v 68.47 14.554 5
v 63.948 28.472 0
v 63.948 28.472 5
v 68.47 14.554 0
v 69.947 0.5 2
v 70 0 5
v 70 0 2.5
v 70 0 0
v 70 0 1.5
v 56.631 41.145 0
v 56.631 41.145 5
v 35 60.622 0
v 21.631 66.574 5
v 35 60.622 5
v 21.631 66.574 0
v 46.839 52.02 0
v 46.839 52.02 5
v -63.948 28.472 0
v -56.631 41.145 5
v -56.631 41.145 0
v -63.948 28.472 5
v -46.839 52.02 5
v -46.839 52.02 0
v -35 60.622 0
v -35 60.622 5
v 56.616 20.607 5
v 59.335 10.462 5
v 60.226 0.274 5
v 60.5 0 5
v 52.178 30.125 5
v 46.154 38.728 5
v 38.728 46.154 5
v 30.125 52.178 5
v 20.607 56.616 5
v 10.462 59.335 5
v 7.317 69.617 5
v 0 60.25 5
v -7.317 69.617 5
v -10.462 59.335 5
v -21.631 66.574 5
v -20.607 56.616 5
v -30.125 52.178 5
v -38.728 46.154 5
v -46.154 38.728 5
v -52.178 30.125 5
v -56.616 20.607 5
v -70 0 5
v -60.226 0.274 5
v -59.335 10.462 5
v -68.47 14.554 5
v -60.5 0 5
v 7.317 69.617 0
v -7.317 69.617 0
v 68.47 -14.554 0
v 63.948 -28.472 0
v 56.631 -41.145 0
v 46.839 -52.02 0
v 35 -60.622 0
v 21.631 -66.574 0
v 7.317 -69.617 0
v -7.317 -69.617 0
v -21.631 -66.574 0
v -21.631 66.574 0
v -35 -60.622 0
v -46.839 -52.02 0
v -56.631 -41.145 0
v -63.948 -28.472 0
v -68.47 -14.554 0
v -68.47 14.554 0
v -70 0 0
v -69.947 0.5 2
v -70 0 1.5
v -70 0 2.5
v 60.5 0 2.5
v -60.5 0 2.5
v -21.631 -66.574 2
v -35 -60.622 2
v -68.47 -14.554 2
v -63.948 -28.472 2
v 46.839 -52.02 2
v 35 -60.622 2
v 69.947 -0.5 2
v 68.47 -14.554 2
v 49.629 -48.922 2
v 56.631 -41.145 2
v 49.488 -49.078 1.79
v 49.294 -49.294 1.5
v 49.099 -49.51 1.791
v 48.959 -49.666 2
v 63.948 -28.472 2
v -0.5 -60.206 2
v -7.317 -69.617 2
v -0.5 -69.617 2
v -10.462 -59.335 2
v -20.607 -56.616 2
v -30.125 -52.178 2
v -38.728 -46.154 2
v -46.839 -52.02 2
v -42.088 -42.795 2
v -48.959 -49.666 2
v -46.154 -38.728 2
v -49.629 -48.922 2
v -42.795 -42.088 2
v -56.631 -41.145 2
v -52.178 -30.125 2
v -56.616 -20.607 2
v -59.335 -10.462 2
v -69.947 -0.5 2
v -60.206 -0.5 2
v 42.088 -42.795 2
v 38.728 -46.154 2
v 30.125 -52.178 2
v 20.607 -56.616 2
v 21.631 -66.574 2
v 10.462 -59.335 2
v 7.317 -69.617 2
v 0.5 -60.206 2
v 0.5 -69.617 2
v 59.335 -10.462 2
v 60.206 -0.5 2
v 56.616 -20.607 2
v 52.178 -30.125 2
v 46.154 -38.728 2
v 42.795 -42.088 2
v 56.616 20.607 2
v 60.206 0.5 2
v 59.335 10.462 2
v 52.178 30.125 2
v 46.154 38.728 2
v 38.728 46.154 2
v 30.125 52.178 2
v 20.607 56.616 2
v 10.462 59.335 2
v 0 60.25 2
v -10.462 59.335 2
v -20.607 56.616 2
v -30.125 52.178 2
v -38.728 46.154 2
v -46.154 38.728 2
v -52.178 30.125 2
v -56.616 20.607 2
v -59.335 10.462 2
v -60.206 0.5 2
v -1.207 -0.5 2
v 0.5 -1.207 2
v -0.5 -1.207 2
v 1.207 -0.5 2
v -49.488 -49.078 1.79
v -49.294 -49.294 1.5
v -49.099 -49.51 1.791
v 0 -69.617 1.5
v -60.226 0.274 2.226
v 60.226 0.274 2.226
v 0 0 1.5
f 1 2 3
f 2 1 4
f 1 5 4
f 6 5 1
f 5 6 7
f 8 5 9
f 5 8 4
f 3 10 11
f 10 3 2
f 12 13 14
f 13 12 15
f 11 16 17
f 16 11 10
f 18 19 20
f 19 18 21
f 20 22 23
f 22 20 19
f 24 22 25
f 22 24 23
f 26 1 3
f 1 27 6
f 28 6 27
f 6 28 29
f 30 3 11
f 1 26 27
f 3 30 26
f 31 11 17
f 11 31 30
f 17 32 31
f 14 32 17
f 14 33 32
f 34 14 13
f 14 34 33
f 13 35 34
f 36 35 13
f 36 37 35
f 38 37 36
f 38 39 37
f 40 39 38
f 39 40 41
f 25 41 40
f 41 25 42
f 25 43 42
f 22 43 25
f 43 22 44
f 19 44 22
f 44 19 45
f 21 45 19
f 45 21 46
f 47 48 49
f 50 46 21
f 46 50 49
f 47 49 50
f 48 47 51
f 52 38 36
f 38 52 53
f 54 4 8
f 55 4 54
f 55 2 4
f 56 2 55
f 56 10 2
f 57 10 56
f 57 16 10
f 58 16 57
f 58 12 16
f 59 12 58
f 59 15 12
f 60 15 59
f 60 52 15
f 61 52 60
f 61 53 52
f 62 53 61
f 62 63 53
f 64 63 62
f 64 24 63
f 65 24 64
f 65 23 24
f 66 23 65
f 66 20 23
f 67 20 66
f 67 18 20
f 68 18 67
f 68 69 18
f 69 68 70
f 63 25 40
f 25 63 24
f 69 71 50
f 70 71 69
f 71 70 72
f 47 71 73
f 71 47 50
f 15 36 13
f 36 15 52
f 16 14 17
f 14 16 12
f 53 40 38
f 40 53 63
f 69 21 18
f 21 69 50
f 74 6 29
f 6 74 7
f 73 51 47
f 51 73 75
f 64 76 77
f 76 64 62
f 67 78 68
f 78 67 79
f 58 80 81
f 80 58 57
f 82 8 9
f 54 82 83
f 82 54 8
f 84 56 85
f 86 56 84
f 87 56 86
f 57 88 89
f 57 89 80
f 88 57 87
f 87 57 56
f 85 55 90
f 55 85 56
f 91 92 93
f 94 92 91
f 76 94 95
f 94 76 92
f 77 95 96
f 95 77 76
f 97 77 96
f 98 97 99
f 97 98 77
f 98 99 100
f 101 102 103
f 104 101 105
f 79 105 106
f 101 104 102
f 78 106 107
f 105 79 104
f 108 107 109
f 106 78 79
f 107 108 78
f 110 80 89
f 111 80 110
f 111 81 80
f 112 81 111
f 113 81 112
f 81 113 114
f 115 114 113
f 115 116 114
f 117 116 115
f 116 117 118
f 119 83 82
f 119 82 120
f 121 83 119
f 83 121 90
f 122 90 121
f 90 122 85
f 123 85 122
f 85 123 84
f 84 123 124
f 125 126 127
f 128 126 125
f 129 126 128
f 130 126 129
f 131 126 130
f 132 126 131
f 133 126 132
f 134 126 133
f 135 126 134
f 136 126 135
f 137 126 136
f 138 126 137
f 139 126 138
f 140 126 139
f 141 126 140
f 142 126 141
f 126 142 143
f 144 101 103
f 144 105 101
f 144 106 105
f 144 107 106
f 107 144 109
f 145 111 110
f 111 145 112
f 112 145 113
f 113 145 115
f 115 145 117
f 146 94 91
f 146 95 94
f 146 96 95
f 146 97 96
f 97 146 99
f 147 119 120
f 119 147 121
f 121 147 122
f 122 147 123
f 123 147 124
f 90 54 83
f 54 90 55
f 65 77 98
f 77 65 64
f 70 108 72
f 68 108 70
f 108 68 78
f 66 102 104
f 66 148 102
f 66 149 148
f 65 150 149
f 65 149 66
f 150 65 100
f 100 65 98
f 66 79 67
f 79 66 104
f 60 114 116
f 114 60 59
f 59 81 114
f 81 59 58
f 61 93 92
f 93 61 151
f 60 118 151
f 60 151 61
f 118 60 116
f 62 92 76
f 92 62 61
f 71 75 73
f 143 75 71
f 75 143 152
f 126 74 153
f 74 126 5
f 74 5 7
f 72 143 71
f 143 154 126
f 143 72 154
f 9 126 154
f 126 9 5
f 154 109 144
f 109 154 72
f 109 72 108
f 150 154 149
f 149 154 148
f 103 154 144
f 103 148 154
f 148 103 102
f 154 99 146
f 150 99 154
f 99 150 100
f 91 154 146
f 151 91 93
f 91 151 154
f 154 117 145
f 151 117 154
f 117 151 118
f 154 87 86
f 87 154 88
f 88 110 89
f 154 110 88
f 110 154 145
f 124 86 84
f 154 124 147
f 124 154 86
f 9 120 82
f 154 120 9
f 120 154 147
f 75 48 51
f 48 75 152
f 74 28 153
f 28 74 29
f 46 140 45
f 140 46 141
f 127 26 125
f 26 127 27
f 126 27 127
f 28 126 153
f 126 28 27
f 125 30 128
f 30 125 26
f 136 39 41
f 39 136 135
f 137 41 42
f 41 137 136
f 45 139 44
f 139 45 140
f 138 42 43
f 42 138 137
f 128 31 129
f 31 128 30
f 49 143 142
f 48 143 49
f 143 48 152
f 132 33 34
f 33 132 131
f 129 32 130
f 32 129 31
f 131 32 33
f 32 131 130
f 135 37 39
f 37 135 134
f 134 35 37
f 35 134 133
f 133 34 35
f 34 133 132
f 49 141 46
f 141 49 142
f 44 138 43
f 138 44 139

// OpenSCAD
//The diameter of the miniature's base (widest point)
marker = 120; // [10:200]

difference(){
    union(){
        cylinder(d = marker+20, h=2);
        intersection(){
            cylinder(d=marker+20,h=5);
            translate([-(marker+20)/2,0,0])
            cube([marker+20,marker+20,5]);
        }
    }
    translate([0,0,2])
    cylinder(d = marker+0.5, h = 5, $fn=36);
    translate([0,0,2])
    for(r = [0:45:180]){
        rotate(r)
        rotate([0,-90,0])
        cylinder(d=1,h=marker,$fn=4);
    }
    for(x = [-marker/2,marker/2]){
        translate([x,0,2])
        cylinder(d=1,h=marker,$fn=4);
    }
}
